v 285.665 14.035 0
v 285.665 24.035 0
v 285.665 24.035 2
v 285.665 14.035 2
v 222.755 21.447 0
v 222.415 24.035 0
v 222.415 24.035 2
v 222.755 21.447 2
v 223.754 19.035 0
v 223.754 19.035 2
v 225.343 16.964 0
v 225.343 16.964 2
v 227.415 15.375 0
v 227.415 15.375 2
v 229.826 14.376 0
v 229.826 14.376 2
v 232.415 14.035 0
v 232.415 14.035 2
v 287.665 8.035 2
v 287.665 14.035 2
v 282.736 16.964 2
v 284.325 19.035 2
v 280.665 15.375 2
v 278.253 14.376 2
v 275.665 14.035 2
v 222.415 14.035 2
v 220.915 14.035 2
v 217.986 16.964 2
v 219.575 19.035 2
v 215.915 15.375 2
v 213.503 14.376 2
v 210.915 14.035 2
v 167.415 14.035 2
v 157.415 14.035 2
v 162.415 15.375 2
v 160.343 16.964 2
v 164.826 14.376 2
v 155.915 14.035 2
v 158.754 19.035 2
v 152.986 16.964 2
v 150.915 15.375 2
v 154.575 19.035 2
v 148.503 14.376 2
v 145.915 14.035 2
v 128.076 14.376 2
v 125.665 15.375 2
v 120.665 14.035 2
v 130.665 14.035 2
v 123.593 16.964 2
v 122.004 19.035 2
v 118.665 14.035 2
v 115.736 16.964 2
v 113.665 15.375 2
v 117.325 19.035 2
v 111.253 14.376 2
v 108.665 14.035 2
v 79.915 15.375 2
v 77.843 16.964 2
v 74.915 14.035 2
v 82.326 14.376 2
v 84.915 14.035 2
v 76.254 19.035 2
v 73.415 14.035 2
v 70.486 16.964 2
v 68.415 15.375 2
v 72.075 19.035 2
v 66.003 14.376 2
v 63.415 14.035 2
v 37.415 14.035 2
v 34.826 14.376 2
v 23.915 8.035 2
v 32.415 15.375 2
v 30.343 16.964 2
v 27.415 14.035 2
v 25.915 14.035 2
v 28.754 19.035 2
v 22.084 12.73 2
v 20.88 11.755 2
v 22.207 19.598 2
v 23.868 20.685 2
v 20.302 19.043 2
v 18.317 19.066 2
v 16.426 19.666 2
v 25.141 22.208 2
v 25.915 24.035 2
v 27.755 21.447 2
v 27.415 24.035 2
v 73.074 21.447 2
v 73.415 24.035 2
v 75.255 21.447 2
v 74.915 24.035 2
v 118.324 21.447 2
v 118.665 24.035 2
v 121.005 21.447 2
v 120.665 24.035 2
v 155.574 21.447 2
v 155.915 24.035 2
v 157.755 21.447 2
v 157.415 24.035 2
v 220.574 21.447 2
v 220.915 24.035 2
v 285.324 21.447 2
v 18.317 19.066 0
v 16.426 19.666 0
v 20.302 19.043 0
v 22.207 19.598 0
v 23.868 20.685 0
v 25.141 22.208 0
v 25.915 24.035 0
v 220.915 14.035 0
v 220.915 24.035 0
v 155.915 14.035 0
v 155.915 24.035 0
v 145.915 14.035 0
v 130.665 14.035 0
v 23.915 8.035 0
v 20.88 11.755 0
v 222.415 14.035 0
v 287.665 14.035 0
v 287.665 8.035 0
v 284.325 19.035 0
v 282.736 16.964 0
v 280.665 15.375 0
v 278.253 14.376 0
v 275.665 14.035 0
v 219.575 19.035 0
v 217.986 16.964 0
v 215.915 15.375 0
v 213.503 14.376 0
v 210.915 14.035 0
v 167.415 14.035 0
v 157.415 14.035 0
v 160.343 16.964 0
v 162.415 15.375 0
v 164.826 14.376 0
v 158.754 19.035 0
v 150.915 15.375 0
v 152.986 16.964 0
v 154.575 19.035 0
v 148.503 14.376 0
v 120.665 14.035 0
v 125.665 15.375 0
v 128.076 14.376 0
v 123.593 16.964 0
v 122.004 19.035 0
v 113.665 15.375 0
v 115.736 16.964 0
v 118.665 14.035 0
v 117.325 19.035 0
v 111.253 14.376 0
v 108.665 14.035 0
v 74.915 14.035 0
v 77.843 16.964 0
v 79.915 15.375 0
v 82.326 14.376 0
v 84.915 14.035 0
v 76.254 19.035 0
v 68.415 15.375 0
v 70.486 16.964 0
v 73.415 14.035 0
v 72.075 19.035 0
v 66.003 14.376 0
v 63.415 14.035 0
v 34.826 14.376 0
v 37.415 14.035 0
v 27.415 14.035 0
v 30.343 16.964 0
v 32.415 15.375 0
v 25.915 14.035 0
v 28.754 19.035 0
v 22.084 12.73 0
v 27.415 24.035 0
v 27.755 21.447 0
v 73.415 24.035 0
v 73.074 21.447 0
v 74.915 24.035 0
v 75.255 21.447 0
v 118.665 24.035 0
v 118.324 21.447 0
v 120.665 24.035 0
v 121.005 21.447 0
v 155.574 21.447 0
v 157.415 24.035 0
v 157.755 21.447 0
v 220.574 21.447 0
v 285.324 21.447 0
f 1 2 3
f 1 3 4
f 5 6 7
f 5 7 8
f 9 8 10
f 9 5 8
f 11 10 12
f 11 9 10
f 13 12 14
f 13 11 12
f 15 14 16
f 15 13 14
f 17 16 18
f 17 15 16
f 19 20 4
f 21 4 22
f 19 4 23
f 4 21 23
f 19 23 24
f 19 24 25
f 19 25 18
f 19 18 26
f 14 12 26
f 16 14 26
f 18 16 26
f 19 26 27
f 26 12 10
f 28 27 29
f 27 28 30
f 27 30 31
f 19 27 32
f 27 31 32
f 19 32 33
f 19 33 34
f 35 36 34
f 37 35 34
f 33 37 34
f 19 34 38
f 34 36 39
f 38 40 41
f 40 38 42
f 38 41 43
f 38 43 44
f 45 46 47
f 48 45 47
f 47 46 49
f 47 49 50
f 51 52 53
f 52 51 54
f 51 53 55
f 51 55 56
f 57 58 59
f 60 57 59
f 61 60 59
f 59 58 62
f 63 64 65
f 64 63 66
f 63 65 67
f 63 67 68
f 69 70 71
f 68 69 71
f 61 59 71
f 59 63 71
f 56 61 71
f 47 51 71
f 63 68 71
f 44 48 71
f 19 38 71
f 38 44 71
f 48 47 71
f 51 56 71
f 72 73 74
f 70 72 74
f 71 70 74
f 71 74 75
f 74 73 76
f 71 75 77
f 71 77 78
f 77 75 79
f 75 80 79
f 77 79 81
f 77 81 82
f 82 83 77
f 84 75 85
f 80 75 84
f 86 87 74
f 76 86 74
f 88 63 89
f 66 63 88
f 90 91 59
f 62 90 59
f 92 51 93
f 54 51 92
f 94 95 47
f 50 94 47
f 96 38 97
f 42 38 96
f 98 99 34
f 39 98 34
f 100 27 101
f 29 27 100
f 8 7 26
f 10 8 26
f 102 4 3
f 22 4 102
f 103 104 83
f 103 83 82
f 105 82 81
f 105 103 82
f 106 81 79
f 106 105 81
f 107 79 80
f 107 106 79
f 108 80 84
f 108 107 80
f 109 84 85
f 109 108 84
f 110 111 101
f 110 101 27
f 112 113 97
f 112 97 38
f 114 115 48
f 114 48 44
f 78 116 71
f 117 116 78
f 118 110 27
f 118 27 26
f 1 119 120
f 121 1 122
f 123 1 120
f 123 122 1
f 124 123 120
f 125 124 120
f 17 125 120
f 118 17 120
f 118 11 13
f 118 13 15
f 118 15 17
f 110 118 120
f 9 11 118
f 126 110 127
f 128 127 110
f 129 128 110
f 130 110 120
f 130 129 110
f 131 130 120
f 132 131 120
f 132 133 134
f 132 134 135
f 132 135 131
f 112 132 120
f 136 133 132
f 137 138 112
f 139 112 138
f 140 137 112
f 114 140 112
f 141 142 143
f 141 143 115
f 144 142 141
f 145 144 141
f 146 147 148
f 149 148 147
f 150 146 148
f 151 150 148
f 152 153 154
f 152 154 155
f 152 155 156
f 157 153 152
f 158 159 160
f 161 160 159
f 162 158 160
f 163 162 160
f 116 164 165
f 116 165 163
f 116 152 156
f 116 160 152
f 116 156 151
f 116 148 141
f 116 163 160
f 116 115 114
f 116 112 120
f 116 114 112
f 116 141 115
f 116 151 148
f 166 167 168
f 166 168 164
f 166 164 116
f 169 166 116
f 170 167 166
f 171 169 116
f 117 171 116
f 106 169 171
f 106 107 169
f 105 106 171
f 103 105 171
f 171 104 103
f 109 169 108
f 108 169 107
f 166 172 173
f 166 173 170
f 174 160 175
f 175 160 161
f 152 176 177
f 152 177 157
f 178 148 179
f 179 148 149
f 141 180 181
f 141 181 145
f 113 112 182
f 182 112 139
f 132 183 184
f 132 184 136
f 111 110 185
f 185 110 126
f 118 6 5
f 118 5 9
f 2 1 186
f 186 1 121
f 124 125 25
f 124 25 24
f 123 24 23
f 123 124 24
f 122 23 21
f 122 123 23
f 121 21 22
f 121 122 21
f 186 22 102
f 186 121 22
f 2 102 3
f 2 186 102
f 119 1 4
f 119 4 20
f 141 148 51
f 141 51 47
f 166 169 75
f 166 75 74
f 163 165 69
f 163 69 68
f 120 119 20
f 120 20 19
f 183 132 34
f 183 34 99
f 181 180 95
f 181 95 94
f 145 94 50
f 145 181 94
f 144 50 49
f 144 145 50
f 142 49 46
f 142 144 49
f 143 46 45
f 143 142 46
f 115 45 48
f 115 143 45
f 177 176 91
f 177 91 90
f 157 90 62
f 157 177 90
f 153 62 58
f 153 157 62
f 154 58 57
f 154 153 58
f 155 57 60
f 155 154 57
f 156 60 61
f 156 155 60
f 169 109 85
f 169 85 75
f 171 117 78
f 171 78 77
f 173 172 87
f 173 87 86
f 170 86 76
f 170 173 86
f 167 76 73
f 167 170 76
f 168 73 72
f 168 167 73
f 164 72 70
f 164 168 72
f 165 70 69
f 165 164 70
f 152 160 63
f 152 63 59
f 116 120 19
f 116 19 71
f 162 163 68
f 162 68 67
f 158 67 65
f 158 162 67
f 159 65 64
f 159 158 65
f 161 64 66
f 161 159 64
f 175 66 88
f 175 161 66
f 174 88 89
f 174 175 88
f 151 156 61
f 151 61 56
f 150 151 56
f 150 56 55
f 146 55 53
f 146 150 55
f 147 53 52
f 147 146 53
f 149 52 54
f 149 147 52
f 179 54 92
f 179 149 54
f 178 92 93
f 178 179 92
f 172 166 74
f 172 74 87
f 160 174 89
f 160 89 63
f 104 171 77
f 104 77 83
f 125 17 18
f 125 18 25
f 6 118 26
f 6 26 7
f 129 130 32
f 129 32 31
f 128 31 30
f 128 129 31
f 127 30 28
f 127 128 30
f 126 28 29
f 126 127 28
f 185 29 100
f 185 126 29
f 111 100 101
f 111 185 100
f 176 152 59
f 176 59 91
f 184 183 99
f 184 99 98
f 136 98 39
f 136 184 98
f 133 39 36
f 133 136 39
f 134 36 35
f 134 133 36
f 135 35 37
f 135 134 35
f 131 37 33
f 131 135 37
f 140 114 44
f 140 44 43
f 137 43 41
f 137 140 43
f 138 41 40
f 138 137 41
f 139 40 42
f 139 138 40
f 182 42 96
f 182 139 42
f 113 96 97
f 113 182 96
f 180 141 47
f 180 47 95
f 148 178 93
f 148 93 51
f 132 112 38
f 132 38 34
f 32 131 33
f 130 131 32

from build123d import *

# Parameters (mm, degrees)
EXTRUDE_1_DEPTH = 2


with BuildPart() as part:
    # Model → 凸台-拉伸1 (new body)
    with BuildSketch(Plane.XY):
        with BuildLine():
            Line((287.664550766, 8.035001988), (23.914550766, 8.035001988))
            Line((23.914550766, 8.035001988), (20.879974458, 11.754816811))
            Line((20.879974458, 11.754816811), (22.08435013, 12.730101001))
            Line((22.08435013, 12.730101001), (16.425816067, 19.66638978))
            ThreePointArc((16.425816067, 19.66638978), (22.207201951, 19.598265756), (25.914550766, 24.035001988))
            Line((25.914550766, 24.035001988), (25.914550766, 14.035001988))
            Line((25.914550766, 14.035001988), (27.414546887, 14.035001988))
            Line((27.414546887, 14.035001988), (27.414546887, 24.035001988))
            ThreePointArc((27.414546887, 24.035001988), (30.343479076, 16.963934176), (37.414546887, 14.035001988))
            Line((37.414546887, 14.035001988), (63.414550766, 14.035001988))
            ThreePointArc((63.414550766, 14.035001988), (70.485618578, 16.963934176), (73.414550766, 24.035001988))
            Line((73.414550766, 24.035001988), (73.414550766, 14.035001988))
            Line((73.414550766, 14.035001988), (74.914546887, 14.035001988))
            Line((74.914546887, 14.035001988), (74.914546887, 24.035001988))
            ThreePointArc((74.914546887, 24.035001988), (77.843479076, 16.963934176), (84.914546887, 14.035001988))
            Line((84.914546887, 14.035001988), (108.664550766, 14.035001988))
            ThreePointArc((108.664550766, 14.035001988), (115.735618578, 16.963934176), (118.664550766, 24.035001988))
            Line((118.664550766, 24.035001988), (118.664550766, 14.035001988))
            Line((118.664550766, 14.035001988), (120.664546887, 14.035001988))
            Line((120.664546887, 14.035001988), (120.664546887, 24.035001988))
            ThreePointArc((120.664546887, 24.035001988), (123.593479076, 16.963934176), (130.664546887, 14.035001988))
            Line((130.664546887, 14.035001988), (145.914550766, 14.035001988))
            ThreePointArc((145.914550766, 14.035001988), (152.985618578, 16.963934176), (155.914550766, 24.035001988))
            Line((155.914550766, 24.035001988), (155.914550766, 14.035001988))
            Line((155.914550766, 14.035001988), (157.414546887, 14.035001988))
            Line((157.414546887, 14.035001988), (157.414546887, 24.035001988))
            ThreePointArc((157.414546887, 24.035001988), (160.343479076, 16.963934176), (167.414546887, 14.035001988))
            Line((167.414546887, 14.035001988), (210.914550766, 14.035001988))
            ThreePointArc((210.914550766, 14.035001988), (217.985618578, 16.963934176), (220.914550766, 24.035001988))
            Line((220.914550766, 24.035001988), (220.914550766, 14.035001988))
            Line((220.914550766, 14.035001988), (222.414550766, 14.035001988))
            Line((222.414550766, 14.035001988), (222.414550766, 24.035001988))
            ThreePointArc((222.414550766, 24.035001988), (225.343482954, 16.963934176), (232.414550766, 14.035001988))
            Line((232.414550766, 14.035001988), (275.664550766, 14.035001988))
            ThreePointArc((275.664550766, 14.035001988), (282.735618578, 16.963934176), (285.664550766, 24.035001988))
            Line((285.664550766, 24.035001988), (285.664550766, 14.035001988))
            Line((285.664550766, 14.035001988), (287.664550766, 14.035001988))
            Line((287.664550766, 14.035001988), (287.664550766, 8.035001988))
        make_face()
    extrude(amount=EXTRUDE_1_DEPTH)


solid = part.part
